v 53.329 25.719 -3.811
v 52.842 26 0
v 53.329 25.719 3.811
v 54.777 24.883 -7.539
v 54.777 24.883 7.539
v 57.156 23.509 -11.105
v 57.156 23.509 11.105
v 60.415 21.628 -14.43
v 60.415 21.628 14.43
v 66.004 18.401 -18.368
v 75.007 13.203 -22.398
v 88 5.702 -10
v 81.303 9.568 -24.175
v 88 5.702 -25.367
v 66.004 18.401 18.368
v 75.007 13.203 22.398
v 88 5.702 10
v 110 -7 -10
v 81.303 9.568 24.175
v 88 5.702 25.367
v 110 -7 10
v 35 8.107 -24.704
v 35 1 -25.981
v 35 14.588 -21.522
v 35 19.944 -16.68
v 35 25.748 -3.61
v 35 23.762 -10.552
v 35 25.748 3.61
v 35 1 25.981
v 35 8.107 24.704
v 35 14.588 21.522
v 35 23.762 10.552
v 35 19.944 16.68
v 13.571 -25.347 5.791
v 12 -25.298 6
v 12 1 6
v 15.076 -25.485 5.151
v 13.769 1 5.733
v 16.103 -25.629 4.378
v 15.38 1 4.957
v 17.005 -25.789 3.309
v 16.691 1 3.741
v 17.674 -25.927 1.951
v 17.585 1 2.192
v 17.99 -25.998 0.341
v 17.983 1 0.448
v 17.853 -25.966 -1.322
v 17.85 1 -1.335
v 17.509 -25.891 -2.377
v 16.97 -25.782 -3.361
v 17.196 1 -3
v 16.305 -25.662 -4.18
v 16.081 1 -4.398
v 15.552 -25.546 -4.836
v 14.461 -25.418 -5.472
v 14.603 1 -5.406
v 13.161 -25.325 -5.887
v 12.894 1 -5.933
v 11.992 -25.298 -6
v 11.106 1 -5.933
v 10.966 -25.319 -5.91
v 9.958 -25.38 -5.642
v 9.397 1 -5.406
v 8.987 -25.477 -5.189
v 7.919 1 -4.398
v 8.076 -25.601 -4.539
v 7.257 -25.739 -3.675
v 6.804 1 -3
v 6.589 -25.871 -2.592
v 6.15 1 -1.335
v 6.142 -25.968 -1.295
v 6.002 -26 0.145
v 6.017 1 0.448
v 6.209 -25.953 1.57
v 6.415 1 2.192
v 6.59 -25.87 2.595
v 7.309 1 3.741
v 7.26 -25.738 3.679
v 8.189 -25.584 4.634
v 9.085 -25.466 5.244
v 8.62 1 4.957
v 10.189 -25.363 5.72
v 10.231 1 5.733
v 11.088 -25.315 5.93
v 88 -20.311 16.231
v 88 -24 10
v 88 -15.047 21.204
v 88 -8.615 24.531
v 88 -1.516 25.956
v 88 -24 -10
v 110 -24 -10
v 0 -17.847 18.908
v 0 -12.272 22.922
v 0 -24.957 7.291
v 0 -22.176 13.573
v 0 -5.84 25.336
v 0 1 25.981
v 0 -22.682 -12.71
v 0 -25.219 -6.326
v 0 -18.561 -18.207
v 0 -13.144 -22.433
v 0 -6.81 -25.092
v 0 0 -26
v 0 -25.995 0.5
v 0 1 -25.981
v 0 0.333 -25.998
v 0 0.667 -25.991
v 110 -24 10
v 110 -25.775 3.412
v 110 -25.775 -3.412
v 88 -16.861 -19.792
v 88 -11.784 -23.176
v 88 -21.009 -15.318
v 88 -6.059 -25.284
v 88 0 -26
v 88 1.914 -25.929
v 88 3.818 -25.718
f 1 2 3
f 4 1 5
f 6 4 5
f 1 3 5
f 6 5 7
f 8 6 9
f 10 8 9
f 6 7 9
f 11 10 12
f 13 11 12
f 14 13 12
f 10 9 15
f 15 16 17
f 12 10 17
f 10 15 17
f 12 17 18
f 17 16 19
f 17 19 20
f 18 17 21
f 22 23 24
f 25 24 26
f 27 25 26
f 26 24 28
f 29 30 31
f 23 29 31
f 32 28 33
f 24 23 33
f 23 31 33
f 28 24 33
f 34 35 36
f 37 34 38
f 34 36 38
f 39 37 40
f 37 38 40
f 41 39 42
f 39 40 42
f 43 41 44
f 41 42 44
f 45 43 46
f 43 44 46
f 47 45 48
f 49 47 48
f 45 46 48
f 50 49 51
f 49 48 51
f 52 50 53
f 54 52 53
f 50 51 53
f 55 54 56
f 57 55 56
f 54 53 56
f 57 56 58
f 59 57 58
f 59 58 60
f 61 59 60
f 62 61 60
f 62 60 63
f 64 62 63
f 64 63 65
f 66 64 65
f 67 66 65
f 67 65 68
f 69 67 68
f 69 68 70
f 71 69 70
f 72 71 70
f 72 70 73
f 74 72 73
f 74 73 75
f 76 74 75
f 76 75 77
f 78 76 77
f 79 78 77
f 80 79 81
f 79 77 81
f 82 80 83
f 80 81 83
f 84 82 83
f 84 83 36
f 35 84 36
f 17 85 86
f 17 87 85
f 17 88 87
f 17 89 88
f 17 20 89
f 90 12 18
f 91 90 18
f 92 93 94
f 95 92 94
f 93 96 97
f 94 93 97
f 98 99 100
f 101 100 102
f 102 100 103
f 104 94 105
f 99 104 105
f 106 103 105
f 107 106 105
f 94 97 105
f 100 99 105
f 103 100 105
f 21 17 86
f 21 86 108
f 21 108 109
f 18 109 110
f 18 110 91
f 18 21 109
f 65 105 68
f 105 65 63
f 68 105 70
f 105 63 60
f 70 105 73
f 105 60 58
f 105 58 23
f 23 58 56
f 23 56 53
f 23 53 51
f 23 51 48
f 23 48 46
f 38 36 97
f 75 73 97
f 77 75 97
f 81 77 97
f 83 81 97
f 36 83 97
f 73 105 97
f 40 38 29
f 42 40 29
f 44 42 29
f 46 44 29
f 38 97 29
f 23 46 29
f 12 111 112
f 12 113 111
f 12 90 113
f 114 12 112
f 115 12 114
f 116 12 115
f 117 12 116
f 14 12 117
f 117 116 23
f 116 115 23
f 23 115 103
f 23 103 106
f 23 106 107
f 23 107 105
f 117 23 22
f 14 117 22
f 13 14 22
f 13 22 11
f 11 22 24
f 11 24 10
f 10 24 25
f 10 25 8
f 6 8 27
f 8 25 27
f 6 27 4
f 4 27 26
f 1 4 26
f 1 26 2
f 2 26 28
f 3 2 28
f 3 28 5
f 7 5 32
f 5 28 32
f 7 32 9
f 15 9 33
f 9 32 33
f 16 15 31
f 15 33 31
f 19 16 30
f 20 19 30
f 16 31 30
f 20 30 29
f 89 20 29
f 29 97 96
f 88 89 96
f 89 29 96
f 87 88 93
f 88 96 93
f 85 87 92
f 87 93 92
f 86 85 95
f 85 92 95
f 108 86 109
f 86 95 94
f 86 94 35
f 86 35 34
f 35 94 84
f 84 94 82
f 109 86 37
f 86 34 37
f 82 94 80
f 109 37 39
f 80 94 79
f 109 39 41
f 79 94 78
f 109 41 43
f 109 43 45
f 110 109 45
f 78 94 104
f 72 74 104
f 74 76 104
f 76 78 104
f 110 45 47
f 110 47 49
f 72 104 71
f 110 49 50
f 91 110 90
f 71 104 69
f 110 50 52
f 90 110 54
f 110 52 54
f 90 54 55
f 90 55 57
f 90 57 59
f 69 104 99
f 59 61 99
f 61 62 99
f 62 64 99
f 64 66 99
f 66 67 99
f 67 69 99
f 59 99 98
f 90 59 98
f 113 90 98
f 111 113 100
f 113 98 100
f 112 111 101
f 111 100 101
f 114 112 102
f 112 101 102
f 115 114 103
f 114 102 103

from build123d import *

# Parameters (mm, degrees)
SKETCH2_R                           = 26
BOSS_EXTRUDE1_DEPTH                 = 110
CUT_EXTRUDE1_REACH                  = 117.983
CUT_EXTRUDE1_END_RADIUS             = 26
SKETCH3_W                           = 35
SKETCH3_H                           = 25
CUT_EXTRUDE1_DIRECTION_2_REACH      = 117.983
CUT_EXTRUDE1_DIRECTION_2_END_RADIUS = 26
CUT_EXTRUDE2_REACH                  = 118.211
CUT_EXTRUDE2_END_RADIUS             = 26
SKETCH4_R                           = 6
CUT_EXTRUDE4_REACH                  = 117.983
SKETCH6_W                           = 22
SKETCH6_H                           = 16
CUT_EXTRUDE4_DIRECTION_2_REACH      = 117.983


with BuildPart() as part:
    # Sketch2 → Boss-Extrude1 (new body)
    with BuildSketch(Plane(origin=(0, 0, 0), x_dir=(0, 0, -1), z_dir=(1, 0, 0))):
        Circle(SKETCH2_R)
    extrude(amount=BOSS_EXTRUDE1_DEPTH)

    # Cut-Extrude1: up to this cylinder (the profile starts inside it)
    cut_extrude1_end = Plane(origin=(54.2237205, 0, 0), z_dir=(-1, 0, 0)) * Cylinder(CUT_EXTRUDE1_END_RADIUS, 362.413441, mode=Mode.PRIVATE)
    # Sketch3 → Cut-Extrude1 (cut, up to the surface)
    with BuildSketch(Plane.XY, mode=Mode.PRIVATE) as cut_extrude1_sk1:
        with Locations((17.5, 13.5)):
            Rectangle(SKETCH3_W, SKETCH3_H)
    cut_extrude1_tool1 = extrude(cut_extrude1_sk1.sketch, amount=-CUT_EXTRUDE1_REACH, mode=Mode.PRIVATE) & cut_extrude1_end
    add(cut_extrude1_tool1.solids().sort_by_distance((17.5, 13.5, 0))[0], mode=Mode.SUBTRACT)
    # Sketch3 → Cut-Extrude1 (cut, up to the surface)
    with BuildSketch(Plane.XY, mode=Mode.PRIVATE) as cut_extrude1_sk2:
        Polygon((52.84232335, 26), (110, -7), (110, 26), align=None)
    cut_extrude1_tool2 = extrude(cut_extrude1_sk2.sketch, amount=-CUT_EXTRUDE1_REACH, mode=Mode.PRIVATE) & cut_extrude1_end
    add(cut_extrude1_tool2.solids().sort_by_distance((90.947441, 15, 0))[0], mode=Mode.SUBTRACT)

    # Cut-Extrude1 direction 2: up to this cylinder (the profile starts inside it)
    cut_extrude1_direction_2_end = Plane(origin=(54.2237205, 0, 0), z_dir=(-1, 0, 0)) * Cylinder(CUT_EXTRUDE1_DIRECTION_2_END_RADIUS, 362.413441, mode=Mode.PRIVATE)
    # Sketch3 → Cut-Extrude1 direction 2 (cut, up to the surface)
    with BuildSketch(Plane.XY, mode=Mode.PRIVATE) as cut_extrude1_direction_2_sk1:
        with Locations((17.5, 13.5)):
            Rectangle(SKETCH3_W, SKETCH3_H)
    cut_extrude1_direction_2_tool1 = extrude(cut_extrude1_direction_2_sk1.sketch, amount=CUT_EXTRUDE1_DIRECTION_2_REACH, mode=Mode.PRIVATE) & cut_extrude1_direction_2_end
    add(cut_extrude1_direction_2_tool1.solids().sort_by_distance((17.5, 13.5, 0))[0], mode=Mode.SUBTRACT)
    # Sketch3 → Cut-Extrude1 direction 2 (cut, up to the surface)
    with BuildSketch(Plane.XY, mode=Mode.PRIVATE) as cut_extrude1_direction_2_sk2:
        Polygon((52.84232335, 26), (110, -7), (110, 26), align=None)
    cut_extrude1_direction_2_tool2 = extrude(cut_extrude1_direction_2_sk2.sketch, amount=CUT_EXTRUDE1_DIRECTION_2_REACH, mode=Mode.PRIVATE) & cut_extrude1_direction_2_end
    add(cut_extrude1_direction_2_tool2.solids().sort_by_distance((90.947441, 15, 0))[0], mode=Mode.SUBTRACT)

    # Cut-Extrude2: up to this cylinder (the profile starts inside it)
    cut_extrude2_end = Plane(origin=(12, 0, 0), z_dir=(-1, 0, 0)) * Cylinder(CUT_EXTRUDE2_END_RADIUS, 289.422, mode=Mode.PRIVATE)
    # Sketch4 → Cut-Extrude2 (cut, up to the surface)
    with BuildSketch(Plane(origin=(0, 1, 0), x_dir=(1, 0, 0), z_dir=(0, 1, 0)), mode=Mode.PRIVATE) as cut_extrude2_sk1:
        with Locations(Location((12, 0, 0), (0, 0, 270))):
            Circle(SKETCH4_R)
    cut_extrude2_tool1 = extrude(cut_extrude2_sk1.sketch, amount=-CUT_EXTRUDE2_REACH, mode=Mode.PRIVATE) & cut_extrude2_end
    add(cut_extrude2_tool1.solids().sort_by_distance((12, 1, 0))[0], mode=Mode.SUBTRACT)

    # Sketch6 → Cut-Extrude4 (cut, up to next)
    with BuildSketch(Plane(origin=(0, 0, 0), x_dir=(1, 0, 0), z_dir=(0, 1, 0)), mode=Mode.PRIVATE) as cut_extrude4_sk1:
        with Locations((99, 18)):
            Rectangle(SKETCH6_W, SKETCH6_H)
    cut_extrude4_tool1 = extrude(cut_extrude4_sk1.sketch, amount=-CUT_EXTRUDE4_REACH, mode=Mode.PRIVATE) & part.part
    # Sketch6 → Cut-Extrude4 (cut, up to next)
    with BuildSketch(Plane(origin=(0, 0, 0), x_dir=(1, 0, 0), z_dir=(0, 1, 0)), mode=Mode.PRIVATE) as cut_extrude4_sk2:
        with Locations((99, -18)):
            Rectangle(SKETCH6_W, SKETCH6_H)
    cut_extrude4_tool2 = extrude(cut_extrude4_sk2.sketch, amount=-CUT_EXTRUDE4_REACH, mode=Mode.PRIVATE) & part.part
    add(cut_extrude4_tool1.solids().sort_by_distance((99, 0, -18))[0], mode=Mode.SUBTRACT)
    add(cut_extrude4_tool2.solids().sort_by_distance((99, 0, 18))[0], mode=Mode.SUBTRACT)

    # Sketch6 → Cut-Extrude4 direction 2 (cut, up to next)
    with BuildSketch(Plane(origin=(0, 0, 0), x_dir=(1, 0, 0), z_dir=(0, 1, 0)), mode=Mode.PRIVATE) as cut_extrude4_direction_2_sk1:
        with Locations((99, 18)):
            Rectangle(SKETCH6_W, SKETCH6_H)
    cut_extrude4_direction_2_tool1 = extrude(cut_extrude4_direction_2_sk1.sketch, amount=CUT_EXTRUDE4_DIRECTION_2_REACH, mode=Mode.PRIVATE) & part.part
    # Sketch6 → Cut-Extrude4 direction 2 (cut, up to next)
    with BuildSketch(Plane(origin=(0, 0, 0), x_dir=(1, 0, 0), z_dir=(0, 1, 0)), mode=Mode.PRIVATE) as cut_extrude4_direction_2_sk2:
        with Locations((99, -18)):
            Rectangle(SKETCH6_W, SKETCH6_H)
    cut_extrude4_direction_2_tool2 = extrude(cut_extrude4_direction_2_sk2.sketch, amount=CUT_EXTRUDE4_DIRECTION_2_REACH, mode=Mode.PRIVATE) & part.part
    add(cut_extrude4_direction_2_tool1.solids().sort_by_distance((99, 0, -18))[0], mode=Mode.SUBTRACT)
    add(cut_extrude4_direction_2_tool2.solids().sort_by_distance((99, 0, 18))[0], mode=Mode.SUBTRACT)


solid = part.part
